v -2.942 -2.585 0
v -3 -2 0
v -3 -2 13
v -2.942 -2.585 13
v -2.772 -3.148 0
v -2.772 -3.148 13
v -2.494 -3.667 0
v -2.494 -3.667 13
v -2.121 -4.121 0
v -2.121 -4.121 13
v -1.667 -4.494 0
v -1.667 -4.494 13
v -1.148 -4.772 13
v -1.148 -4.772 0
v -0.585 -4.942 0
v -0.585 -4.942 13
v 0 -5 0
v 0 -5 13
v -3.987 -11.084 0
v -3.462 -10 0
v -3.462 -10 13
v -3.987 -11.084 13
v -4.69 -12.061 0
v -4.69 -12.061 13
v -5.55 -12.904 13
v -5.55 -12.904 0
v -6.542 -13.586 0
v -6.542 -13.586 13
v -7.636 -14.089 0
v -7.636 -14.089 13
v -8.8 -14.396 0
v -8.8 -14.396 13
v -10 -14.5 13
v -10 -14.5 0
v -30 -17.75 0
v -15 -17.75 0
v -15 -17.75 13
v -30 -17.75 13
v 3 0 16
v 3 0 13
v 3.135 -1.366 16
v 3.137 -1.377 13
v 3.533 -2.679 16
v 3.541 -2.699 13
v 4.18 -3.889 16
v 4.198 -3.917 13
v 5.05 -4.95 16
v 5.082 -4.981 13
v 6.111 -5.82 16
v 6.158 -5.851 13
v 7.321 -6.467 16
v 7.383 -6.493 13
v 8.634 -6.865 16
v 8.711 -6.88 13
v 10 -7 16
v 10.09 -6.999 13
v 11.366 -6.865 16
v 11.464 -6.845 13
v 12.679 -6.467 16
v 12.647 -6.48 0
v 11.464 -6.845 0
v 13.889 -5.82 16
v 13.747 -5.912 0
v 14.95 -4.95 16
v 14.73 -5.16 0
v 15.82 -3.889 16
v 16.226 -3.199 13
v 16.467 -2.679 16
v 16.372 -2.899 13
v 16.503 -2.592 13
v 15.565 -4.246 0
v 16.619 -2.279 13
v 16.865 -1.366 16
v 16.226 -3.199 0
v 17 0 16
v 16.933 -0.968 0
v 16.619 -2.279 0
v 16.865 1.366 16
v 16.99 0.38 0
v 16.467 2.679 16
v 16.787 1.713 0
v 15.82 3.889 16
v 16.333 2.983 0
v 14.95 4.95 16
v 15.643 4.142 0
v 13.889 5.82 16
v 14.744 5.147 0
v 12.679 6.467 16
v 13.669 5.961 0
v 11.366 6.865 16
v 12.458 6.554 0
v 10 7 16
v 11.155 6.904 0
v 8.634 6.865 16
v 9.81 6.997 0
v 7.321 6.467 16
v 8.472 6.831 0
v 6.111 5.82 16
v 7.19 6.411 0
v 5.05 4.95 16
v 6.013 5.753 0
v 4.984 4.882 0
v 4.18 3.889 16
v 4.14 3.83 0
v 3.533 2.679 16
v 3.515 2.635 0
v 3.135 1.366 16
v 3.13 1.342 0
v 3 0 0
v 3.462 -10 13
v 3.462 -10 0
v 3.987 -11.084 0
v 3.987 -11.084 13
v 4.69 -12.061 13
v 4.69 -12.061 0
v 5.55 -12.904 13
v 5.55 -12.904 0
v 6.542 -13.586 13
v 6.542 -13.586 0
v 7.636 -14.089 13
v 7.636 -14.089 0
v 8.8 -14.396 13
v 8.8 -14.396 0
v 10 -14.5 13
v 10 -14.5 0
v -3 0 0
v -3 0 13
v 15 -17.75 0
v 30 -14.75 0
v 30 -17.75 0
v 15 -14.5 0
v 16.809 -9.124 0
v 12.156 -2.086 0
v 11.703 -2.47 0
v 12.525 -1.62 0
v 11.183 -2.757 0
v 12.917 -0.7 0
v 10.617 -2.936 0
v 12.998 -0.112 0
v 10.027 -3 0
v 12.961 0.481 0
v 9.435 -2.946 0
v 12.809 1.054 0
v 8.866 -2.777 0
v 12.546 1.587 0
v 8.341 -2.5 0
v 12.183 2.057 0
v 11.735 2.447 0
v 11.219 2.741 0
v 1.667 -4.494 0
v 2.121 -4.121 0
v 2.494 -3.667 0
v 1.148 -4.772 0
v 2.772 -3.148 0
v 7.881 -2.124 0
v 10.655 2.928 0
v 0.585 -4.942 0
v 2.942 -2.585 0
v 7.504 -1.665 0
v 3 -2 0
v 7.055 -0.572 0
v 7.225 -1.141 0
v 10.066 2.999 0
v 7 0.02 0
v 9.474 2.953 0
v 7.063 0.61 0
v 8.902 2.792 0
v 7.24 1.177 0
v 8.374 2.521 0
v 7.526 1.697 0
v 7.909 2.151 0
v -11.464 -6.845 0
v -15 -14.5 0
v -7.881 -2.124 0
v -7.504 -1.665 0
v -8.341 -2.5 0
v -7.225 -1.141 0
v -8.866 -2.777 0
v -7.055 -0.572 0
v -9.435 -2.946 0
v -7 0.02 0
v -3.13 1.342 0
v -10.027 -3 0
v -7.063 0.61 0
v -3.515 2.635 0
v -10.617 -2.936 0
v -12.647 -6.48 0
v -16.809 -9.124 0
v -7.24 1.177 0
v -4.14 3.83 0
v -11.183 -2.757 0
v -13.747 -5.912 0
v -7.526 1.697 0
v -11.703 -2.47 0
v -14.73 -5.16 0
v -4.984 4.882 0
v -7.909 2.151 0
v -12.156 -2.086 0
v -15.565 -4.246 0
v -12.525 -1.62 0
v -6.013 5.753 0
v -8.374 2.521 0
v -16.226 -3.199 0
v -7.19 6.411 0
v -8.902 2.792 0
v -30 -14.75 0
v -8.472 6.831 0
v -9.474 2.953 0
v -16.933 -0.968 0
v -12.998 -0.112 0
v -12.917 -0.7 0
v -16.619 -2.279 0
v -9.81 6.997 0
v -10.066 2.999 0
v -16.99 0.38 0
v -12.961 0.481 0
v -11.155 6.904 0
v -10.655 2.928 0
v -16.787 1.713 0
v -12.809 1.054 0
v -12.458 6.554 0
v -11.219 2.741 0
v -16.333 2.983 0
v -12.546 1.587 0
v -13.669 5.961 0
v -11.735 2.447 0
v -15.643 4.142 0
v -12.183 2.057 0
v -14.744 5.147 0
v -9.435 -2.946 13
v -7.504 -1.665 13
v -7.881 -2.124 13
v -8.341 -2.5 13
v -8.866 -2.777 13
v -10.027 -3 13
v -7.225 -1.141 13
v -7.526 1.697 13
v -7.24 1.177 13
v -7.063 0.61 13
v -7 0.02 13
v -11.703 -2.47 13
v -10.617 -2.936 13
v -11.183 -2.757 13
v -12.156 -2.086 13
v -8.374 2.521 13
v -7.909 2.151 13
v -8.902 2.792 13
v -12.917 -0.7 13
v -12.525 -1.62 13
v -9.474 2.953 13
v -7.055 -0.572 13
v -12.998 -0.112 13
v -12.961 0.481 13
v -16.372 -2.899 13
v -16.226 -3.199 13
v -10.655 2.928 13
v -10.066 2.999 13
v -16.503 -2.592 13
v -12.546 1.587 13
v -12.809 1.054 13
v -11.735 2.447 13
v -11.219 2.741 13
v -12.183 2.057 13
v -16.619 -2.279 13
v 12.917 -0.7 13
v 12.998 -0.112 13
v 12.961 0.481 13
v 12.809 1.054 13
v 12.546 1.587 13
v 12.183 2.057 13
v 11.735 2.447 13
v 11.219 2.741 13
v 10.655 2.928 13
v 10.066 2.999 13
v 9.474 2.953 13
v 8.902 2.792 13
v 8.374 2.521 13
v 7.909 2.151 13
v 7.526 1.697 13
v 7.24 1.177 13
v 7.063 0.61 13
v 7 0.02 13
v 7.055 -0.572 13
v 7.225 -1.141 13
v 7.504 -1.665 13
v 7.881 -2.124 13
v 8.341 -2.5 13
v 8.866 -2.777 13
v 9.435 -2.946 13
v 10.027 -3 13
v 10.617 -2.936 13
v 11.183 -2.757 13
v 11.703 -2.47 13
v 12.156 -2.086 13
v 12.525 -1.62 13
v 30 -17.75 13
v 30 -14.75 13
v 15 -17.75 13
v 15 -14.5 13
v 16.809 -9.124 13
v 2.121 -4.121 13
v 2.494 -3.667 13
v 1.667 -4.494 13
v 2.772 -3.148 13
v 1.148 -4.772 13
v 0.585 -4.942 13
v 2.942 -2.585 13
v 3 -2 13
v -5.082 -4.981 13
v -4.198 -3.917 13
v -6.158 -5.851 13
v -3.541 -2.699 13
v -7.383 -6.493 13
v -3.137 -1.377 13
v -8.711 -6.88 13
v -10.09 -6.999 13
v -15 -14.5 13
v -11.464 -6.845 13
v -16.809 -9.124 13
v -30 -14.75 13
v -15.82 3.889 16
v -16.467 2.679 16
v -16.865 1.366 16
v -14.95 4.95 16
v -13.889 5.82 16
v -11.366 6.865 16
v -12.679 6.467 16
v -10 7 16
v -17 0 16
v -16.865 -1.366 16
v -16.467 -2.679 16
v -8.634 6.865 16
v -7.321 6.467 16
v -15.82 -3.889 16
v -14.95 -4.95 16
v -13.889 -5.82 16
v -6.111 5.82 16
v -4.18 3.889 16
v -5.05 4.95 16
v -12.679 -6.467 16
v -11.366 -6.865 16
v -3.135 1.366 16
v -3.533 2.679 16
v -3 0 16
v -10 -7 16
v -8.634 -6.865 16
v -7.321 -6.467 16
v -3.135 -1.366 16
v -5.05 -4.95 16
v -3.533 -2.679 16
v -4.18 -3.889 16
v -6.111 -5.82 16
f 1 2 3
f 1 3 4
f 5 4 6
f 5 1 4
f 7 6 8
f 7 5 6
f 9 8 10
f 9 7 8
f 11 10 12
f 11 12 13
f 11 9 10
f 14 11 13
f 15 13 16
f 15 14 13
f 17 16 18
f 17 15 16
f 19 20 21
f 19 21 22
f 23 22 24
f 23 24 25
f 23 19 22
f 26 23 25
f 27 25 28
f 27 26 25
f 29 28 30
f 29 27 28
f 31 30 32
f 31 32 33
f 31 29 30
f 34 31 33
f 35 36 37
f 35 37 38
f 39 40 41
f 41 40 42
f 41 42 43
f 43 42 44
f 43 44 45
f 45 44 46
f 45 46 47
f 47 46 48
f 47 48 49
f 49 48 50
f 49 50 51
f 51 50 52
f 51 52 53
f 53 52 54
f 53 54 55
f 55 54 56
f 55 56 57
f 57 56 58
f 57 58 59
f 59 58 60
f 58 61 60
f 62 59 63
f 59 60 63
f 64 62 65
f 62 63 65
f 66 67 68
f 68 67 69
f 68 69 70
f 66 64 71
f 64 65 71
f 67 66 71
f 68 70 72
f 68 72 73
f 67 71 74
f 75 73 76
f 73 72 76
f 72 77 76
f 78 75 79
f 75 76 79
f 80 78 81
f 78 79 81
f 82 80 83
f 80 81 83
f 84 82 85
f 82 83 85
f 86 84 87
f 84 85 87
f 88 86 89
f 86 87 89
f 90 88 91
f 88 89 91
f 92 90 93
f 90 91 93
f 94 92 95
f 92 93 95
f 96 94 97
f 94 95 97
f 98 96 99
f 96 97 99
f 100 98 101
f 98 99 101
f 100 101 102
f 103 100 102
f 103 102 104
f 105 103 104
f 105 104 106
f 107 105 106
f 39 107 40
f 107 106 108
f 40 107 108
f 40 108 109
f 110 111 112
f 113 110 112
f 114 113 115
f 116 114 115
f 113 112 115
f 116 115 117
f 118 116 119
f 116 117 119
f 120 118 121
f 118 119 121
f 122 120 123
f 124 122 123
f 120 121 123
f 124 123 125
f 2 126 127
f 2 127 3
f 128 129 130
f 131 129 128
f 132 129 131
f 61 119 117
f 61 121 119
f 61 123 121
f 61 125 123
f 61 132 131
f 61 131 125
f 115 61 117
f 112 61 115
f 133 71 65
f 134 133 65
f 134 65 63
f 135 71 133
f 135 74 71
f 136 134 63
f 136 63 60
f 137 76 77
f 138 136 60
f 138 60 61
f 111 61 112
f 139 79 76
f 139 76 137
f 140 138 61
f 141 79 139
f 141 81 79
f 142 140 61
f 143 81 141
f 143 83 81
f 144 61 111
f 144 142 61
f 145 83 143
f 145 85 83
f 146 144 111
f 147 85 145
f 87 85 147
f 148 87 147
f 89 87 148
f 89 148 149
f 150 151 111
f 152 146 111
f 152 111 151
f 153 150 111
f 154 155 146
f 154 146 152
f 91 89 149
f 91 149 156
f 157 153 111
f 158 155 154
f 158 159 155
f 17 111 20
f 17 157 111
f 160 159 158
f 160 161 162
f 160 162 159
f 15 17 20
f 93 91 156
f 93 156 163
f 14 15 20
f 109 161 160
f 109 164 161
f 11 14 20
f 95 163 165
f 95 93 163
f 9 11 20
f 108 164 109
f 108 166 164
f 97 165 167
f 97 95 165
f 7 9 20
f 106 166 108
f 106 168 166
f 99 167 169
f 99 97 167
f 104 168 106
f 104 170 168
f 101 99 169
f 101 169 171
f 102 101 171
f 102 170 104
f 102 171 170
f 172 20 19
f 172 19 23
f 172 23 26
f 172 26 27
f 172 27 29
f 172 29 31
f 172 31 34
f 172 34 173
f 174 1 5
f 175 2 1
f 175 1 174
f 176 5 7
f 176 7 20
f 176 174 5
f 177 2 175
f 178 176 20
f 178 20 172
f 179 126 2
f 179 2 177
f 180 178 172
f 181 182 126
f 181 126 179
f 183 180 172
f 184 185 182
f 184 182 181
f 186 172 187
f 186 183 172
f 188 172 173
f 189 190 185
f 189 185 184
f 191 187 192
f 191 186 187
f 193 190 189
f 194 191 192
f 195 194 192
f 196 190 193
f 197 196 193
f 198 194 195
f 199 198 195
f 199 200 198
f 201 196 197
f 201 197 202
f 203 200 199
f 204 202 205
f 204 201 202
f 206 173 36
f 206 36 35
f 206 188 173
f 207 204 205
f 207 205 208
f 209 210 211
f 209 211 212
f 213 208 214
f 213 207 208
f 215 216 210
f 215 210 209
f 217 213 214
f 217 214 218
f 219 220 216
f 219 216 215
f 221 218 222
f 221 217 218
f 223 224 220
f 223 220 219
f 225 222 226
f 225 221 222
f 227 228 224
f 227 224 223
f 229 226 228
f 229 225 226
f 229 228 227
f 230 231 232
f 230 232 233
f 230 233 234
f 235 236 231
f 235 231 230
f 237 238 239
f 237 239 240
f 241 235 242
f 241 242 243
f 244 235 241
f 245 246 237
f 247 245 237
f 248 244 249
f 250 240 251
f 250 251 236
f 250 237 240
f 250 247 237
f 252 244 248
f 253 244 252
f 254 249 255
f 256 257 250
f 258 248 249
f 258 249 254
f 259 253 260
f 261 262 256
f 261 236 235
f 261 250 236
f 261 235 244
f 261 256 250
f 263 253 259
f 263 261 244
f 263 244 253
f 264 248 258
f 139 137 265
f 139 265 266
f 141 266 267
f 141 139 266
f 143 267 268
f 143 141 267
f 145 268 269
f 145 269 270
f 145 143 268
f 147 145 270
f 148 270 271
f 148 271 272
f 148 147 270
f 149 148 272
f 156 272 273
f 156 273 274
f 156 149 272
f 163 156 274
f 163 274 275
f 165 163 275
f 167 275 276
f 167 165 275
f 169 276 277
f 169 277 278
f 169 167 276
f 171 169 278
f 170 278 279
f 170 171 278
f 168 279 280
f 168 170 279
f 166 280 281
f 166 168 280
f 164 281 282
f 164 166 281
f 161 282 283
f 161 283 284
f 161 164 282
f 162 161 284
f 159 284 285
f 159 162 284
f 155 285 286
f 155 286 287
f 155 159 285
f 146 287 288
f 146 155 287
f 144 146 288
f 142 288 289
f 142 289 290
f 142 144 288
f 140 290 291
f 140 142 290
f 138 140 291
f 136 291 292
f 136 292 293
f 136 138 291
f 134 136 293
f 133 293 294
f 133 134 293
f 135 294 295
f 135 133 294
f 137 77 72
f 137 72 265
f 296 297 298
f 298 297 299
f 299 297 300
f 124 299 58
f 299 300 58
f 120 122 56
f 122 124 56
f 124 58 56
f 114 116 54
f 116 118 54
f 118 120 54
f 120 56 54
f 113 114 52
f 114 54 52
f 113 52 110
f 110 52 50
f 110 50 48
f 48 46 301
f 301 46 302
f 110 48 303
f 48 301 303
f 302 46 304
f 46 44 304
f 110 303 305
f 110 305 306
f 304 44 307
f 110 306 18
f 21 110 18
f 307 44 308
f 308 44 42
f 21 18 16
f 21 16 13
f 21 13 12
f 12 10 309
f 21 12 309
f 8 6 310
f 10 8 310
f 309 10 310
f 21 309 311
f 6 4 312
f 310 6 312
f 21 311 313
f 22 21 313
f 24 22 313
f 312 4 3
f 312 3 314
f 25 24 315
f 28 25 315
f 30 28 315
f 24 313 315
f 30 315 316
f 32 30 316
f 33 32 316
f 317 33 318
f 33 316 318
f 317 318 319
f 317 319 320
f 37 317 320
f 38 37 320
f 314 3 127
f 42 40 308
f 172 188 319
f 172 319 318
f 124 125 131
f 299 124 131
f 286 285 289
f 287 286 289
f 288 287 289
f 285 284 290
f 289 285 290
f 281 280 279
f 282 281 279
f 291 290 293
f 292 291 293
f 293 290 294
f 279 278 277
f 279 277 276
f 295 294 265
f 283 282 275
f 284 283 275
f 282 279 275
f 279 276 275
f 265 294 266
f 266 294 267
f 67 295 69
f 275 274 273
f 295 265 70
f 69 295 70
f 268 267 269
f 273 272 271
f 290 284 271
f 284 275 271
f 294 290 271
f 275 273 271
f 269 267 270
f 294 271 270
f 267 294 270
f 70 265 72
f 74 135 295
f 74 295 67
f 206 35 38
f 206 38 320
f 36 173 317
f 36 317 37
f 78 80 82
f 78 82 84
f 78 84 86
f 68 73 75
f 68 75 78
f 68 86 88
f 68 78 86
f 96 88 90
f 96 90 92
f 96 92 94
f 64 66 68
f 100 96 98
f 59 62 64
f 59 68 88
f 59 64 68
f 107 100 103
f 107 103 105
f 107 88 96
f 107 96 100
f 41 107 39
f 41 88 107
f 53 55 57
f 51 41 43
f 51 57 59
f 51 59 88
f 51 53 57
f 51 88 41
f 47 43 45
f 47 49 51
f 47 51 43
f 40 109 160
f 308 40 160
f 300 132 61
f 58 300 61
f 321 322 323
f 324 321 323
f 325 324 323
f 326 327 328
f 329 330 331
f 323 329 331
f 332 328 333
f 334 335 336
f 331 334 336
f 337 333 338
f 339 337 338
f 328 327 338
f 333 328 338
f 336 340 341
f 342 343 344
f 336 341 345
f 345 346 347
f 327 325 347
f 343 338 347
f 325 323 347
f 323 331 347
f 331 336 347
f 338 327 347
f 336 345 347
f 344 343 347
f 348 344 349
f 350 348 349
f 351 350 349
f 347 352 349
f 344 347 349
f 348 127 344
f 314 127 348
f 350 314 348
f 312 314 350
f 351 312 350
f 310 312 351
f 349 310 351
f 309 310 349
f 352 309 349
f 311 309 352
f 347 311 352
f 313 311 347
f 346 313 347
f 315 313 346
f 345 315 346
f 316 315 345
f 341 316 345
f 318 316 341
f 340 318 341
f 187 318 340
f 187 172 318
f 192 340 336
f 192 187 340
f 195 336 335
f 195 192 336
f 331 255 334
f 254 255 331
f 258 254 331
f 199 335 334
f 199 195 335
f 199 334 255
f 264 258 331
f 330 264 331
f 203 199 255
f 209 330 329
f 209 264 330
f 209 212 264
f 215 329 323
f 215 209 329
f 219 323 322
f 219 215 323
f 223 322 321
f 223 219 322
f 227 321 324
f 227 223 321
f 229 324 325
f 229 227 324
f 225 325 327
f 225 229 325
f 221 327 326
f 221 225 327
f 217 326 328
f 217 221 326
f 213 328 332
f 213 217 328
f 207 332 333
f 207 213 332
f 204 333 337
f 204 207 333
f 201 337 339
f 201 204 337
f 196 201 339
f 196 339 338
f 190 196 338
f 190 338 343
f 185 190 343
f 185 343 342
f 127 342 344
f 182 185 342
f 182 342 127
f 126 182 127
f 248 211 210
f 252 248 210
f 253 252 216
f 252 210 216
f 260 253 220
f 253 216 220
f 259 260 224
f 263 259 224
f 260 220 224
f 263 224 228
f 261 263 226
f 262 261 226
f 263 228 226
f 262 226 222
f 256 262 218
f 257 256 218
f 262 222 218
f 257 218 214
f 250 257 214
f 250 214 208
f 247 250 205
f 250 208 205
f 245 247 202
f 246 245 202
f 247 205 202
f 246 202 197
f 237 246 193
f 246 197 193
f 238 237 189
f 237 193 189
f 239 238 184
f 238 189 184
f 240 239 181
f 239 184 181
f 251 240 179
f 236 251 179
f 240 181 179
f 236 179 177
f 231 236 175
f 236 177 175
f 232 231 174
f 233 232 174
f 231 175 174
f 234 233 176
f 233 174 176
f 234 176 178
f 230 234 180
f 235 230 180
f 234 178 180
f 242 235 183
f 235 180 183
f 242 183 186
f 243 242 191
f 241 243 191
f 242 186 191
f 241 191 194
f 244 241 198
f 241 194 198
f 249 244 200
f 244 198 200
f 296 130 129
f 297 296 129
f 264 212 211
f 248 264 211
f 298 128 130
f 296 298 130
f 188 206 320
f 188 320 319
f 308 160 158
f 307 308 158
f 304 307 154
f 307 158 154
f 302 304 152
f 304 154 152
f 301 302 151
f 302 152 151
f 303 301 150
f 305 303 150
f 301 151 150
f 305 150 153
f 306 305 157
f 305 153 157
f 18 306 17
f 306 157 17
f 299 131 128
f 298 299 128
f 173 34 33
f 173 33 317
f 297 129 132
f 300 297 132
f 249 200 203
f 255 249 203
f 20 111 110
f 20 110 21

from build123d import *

# Parameters (mm, degrees)
SKETCH1_R           = 7
BOSS_EXTRUDE1_DEPTH = 13
SKETCH2_R           = 7
BOSS_EXTRUDE2_DEPTH = 3
SKETCH3_R           = 3
CUT_EXTRUDE1_DEPTH  = 13


with BuildPart() as part:
    # Sketch1 → Boss-Extrude1 (new body)
    with BuildSketch(Plane.XY):
        with Locations((10, 0)):
            Circle(SKETCH1_R)
        with BuildLine():
            ThreePointArc((3.461651585, -10), (6.031373033, -13.266281297), (10, -14.5))
            Line((10, -14.5), (15, -14.5))
            Line((15, -14.5), (15, -17.75))
            Line((15, -17.75), (30, -17.75))
            Line((30, -17.75), (30, -14.75))
            Line((30, -14.75), (16.808917195, -9.124391157))
            Line((16.808917195, -9.124391157), (11.464397441, -6.845110674))
            ThreePointArc((11.464397441, -6.845110674), (5.598340205, -5.442921187), (3, 0))
            Line((3, 0), (3, -2))
            ThreePointArc((3, -2), (2.121320344, -4.121320344), (0, -5))
            Line((0, -5), (0, -10))
            Line((0, -10), (3.461651585, -10))
        make_face()
    extrude(amount=BOSS_EXTRUDE1_DEPTH)

    # Sketch2 → Boss-Extrude2 (add)
    with BuildSketch(Plane.XY.offset(13)):
        with Locations(Location((10, 0, 0), (0, 0, 180))):
            Circle(SKETCH2_R)
    extrude(amount=BOSS_EXTRUDE2_DEPTH)

    # Sketch3 → Cut-Extrude1 (cut)
    with BuildSketch(Plane.XY):
        with Locations((10, 0)):
            Circle(SKETCH3_R)
        with BuildLine():
            ThreePointArc((12.917076099, -0.70047629), (12.759529774, -1.176858286), (12.524790004, -1.620319548))
            Line((12.524790004, -1.620319548), (16.664084665, -3.385606977))
            Line((16.664084665, -3.385606977), (17.05637076, -2.465763719))
            Line((17.05637076, -2.465763719), (12.917076099, -0.70047629))
        make_face()
    extrude(amount=CUT_EXTRUDE1_DEPTH, mode=Mode.SUBTRACT)

    # Mirror1: part across plane


with BuildPart() as part_1:
    add(part.part)
    add(part.part.mirror(Plane(origin=(0, 0, 0), x_dir=(0, 0, 1), z_dir=(1, 0, 0))))


solid = part_1.part
